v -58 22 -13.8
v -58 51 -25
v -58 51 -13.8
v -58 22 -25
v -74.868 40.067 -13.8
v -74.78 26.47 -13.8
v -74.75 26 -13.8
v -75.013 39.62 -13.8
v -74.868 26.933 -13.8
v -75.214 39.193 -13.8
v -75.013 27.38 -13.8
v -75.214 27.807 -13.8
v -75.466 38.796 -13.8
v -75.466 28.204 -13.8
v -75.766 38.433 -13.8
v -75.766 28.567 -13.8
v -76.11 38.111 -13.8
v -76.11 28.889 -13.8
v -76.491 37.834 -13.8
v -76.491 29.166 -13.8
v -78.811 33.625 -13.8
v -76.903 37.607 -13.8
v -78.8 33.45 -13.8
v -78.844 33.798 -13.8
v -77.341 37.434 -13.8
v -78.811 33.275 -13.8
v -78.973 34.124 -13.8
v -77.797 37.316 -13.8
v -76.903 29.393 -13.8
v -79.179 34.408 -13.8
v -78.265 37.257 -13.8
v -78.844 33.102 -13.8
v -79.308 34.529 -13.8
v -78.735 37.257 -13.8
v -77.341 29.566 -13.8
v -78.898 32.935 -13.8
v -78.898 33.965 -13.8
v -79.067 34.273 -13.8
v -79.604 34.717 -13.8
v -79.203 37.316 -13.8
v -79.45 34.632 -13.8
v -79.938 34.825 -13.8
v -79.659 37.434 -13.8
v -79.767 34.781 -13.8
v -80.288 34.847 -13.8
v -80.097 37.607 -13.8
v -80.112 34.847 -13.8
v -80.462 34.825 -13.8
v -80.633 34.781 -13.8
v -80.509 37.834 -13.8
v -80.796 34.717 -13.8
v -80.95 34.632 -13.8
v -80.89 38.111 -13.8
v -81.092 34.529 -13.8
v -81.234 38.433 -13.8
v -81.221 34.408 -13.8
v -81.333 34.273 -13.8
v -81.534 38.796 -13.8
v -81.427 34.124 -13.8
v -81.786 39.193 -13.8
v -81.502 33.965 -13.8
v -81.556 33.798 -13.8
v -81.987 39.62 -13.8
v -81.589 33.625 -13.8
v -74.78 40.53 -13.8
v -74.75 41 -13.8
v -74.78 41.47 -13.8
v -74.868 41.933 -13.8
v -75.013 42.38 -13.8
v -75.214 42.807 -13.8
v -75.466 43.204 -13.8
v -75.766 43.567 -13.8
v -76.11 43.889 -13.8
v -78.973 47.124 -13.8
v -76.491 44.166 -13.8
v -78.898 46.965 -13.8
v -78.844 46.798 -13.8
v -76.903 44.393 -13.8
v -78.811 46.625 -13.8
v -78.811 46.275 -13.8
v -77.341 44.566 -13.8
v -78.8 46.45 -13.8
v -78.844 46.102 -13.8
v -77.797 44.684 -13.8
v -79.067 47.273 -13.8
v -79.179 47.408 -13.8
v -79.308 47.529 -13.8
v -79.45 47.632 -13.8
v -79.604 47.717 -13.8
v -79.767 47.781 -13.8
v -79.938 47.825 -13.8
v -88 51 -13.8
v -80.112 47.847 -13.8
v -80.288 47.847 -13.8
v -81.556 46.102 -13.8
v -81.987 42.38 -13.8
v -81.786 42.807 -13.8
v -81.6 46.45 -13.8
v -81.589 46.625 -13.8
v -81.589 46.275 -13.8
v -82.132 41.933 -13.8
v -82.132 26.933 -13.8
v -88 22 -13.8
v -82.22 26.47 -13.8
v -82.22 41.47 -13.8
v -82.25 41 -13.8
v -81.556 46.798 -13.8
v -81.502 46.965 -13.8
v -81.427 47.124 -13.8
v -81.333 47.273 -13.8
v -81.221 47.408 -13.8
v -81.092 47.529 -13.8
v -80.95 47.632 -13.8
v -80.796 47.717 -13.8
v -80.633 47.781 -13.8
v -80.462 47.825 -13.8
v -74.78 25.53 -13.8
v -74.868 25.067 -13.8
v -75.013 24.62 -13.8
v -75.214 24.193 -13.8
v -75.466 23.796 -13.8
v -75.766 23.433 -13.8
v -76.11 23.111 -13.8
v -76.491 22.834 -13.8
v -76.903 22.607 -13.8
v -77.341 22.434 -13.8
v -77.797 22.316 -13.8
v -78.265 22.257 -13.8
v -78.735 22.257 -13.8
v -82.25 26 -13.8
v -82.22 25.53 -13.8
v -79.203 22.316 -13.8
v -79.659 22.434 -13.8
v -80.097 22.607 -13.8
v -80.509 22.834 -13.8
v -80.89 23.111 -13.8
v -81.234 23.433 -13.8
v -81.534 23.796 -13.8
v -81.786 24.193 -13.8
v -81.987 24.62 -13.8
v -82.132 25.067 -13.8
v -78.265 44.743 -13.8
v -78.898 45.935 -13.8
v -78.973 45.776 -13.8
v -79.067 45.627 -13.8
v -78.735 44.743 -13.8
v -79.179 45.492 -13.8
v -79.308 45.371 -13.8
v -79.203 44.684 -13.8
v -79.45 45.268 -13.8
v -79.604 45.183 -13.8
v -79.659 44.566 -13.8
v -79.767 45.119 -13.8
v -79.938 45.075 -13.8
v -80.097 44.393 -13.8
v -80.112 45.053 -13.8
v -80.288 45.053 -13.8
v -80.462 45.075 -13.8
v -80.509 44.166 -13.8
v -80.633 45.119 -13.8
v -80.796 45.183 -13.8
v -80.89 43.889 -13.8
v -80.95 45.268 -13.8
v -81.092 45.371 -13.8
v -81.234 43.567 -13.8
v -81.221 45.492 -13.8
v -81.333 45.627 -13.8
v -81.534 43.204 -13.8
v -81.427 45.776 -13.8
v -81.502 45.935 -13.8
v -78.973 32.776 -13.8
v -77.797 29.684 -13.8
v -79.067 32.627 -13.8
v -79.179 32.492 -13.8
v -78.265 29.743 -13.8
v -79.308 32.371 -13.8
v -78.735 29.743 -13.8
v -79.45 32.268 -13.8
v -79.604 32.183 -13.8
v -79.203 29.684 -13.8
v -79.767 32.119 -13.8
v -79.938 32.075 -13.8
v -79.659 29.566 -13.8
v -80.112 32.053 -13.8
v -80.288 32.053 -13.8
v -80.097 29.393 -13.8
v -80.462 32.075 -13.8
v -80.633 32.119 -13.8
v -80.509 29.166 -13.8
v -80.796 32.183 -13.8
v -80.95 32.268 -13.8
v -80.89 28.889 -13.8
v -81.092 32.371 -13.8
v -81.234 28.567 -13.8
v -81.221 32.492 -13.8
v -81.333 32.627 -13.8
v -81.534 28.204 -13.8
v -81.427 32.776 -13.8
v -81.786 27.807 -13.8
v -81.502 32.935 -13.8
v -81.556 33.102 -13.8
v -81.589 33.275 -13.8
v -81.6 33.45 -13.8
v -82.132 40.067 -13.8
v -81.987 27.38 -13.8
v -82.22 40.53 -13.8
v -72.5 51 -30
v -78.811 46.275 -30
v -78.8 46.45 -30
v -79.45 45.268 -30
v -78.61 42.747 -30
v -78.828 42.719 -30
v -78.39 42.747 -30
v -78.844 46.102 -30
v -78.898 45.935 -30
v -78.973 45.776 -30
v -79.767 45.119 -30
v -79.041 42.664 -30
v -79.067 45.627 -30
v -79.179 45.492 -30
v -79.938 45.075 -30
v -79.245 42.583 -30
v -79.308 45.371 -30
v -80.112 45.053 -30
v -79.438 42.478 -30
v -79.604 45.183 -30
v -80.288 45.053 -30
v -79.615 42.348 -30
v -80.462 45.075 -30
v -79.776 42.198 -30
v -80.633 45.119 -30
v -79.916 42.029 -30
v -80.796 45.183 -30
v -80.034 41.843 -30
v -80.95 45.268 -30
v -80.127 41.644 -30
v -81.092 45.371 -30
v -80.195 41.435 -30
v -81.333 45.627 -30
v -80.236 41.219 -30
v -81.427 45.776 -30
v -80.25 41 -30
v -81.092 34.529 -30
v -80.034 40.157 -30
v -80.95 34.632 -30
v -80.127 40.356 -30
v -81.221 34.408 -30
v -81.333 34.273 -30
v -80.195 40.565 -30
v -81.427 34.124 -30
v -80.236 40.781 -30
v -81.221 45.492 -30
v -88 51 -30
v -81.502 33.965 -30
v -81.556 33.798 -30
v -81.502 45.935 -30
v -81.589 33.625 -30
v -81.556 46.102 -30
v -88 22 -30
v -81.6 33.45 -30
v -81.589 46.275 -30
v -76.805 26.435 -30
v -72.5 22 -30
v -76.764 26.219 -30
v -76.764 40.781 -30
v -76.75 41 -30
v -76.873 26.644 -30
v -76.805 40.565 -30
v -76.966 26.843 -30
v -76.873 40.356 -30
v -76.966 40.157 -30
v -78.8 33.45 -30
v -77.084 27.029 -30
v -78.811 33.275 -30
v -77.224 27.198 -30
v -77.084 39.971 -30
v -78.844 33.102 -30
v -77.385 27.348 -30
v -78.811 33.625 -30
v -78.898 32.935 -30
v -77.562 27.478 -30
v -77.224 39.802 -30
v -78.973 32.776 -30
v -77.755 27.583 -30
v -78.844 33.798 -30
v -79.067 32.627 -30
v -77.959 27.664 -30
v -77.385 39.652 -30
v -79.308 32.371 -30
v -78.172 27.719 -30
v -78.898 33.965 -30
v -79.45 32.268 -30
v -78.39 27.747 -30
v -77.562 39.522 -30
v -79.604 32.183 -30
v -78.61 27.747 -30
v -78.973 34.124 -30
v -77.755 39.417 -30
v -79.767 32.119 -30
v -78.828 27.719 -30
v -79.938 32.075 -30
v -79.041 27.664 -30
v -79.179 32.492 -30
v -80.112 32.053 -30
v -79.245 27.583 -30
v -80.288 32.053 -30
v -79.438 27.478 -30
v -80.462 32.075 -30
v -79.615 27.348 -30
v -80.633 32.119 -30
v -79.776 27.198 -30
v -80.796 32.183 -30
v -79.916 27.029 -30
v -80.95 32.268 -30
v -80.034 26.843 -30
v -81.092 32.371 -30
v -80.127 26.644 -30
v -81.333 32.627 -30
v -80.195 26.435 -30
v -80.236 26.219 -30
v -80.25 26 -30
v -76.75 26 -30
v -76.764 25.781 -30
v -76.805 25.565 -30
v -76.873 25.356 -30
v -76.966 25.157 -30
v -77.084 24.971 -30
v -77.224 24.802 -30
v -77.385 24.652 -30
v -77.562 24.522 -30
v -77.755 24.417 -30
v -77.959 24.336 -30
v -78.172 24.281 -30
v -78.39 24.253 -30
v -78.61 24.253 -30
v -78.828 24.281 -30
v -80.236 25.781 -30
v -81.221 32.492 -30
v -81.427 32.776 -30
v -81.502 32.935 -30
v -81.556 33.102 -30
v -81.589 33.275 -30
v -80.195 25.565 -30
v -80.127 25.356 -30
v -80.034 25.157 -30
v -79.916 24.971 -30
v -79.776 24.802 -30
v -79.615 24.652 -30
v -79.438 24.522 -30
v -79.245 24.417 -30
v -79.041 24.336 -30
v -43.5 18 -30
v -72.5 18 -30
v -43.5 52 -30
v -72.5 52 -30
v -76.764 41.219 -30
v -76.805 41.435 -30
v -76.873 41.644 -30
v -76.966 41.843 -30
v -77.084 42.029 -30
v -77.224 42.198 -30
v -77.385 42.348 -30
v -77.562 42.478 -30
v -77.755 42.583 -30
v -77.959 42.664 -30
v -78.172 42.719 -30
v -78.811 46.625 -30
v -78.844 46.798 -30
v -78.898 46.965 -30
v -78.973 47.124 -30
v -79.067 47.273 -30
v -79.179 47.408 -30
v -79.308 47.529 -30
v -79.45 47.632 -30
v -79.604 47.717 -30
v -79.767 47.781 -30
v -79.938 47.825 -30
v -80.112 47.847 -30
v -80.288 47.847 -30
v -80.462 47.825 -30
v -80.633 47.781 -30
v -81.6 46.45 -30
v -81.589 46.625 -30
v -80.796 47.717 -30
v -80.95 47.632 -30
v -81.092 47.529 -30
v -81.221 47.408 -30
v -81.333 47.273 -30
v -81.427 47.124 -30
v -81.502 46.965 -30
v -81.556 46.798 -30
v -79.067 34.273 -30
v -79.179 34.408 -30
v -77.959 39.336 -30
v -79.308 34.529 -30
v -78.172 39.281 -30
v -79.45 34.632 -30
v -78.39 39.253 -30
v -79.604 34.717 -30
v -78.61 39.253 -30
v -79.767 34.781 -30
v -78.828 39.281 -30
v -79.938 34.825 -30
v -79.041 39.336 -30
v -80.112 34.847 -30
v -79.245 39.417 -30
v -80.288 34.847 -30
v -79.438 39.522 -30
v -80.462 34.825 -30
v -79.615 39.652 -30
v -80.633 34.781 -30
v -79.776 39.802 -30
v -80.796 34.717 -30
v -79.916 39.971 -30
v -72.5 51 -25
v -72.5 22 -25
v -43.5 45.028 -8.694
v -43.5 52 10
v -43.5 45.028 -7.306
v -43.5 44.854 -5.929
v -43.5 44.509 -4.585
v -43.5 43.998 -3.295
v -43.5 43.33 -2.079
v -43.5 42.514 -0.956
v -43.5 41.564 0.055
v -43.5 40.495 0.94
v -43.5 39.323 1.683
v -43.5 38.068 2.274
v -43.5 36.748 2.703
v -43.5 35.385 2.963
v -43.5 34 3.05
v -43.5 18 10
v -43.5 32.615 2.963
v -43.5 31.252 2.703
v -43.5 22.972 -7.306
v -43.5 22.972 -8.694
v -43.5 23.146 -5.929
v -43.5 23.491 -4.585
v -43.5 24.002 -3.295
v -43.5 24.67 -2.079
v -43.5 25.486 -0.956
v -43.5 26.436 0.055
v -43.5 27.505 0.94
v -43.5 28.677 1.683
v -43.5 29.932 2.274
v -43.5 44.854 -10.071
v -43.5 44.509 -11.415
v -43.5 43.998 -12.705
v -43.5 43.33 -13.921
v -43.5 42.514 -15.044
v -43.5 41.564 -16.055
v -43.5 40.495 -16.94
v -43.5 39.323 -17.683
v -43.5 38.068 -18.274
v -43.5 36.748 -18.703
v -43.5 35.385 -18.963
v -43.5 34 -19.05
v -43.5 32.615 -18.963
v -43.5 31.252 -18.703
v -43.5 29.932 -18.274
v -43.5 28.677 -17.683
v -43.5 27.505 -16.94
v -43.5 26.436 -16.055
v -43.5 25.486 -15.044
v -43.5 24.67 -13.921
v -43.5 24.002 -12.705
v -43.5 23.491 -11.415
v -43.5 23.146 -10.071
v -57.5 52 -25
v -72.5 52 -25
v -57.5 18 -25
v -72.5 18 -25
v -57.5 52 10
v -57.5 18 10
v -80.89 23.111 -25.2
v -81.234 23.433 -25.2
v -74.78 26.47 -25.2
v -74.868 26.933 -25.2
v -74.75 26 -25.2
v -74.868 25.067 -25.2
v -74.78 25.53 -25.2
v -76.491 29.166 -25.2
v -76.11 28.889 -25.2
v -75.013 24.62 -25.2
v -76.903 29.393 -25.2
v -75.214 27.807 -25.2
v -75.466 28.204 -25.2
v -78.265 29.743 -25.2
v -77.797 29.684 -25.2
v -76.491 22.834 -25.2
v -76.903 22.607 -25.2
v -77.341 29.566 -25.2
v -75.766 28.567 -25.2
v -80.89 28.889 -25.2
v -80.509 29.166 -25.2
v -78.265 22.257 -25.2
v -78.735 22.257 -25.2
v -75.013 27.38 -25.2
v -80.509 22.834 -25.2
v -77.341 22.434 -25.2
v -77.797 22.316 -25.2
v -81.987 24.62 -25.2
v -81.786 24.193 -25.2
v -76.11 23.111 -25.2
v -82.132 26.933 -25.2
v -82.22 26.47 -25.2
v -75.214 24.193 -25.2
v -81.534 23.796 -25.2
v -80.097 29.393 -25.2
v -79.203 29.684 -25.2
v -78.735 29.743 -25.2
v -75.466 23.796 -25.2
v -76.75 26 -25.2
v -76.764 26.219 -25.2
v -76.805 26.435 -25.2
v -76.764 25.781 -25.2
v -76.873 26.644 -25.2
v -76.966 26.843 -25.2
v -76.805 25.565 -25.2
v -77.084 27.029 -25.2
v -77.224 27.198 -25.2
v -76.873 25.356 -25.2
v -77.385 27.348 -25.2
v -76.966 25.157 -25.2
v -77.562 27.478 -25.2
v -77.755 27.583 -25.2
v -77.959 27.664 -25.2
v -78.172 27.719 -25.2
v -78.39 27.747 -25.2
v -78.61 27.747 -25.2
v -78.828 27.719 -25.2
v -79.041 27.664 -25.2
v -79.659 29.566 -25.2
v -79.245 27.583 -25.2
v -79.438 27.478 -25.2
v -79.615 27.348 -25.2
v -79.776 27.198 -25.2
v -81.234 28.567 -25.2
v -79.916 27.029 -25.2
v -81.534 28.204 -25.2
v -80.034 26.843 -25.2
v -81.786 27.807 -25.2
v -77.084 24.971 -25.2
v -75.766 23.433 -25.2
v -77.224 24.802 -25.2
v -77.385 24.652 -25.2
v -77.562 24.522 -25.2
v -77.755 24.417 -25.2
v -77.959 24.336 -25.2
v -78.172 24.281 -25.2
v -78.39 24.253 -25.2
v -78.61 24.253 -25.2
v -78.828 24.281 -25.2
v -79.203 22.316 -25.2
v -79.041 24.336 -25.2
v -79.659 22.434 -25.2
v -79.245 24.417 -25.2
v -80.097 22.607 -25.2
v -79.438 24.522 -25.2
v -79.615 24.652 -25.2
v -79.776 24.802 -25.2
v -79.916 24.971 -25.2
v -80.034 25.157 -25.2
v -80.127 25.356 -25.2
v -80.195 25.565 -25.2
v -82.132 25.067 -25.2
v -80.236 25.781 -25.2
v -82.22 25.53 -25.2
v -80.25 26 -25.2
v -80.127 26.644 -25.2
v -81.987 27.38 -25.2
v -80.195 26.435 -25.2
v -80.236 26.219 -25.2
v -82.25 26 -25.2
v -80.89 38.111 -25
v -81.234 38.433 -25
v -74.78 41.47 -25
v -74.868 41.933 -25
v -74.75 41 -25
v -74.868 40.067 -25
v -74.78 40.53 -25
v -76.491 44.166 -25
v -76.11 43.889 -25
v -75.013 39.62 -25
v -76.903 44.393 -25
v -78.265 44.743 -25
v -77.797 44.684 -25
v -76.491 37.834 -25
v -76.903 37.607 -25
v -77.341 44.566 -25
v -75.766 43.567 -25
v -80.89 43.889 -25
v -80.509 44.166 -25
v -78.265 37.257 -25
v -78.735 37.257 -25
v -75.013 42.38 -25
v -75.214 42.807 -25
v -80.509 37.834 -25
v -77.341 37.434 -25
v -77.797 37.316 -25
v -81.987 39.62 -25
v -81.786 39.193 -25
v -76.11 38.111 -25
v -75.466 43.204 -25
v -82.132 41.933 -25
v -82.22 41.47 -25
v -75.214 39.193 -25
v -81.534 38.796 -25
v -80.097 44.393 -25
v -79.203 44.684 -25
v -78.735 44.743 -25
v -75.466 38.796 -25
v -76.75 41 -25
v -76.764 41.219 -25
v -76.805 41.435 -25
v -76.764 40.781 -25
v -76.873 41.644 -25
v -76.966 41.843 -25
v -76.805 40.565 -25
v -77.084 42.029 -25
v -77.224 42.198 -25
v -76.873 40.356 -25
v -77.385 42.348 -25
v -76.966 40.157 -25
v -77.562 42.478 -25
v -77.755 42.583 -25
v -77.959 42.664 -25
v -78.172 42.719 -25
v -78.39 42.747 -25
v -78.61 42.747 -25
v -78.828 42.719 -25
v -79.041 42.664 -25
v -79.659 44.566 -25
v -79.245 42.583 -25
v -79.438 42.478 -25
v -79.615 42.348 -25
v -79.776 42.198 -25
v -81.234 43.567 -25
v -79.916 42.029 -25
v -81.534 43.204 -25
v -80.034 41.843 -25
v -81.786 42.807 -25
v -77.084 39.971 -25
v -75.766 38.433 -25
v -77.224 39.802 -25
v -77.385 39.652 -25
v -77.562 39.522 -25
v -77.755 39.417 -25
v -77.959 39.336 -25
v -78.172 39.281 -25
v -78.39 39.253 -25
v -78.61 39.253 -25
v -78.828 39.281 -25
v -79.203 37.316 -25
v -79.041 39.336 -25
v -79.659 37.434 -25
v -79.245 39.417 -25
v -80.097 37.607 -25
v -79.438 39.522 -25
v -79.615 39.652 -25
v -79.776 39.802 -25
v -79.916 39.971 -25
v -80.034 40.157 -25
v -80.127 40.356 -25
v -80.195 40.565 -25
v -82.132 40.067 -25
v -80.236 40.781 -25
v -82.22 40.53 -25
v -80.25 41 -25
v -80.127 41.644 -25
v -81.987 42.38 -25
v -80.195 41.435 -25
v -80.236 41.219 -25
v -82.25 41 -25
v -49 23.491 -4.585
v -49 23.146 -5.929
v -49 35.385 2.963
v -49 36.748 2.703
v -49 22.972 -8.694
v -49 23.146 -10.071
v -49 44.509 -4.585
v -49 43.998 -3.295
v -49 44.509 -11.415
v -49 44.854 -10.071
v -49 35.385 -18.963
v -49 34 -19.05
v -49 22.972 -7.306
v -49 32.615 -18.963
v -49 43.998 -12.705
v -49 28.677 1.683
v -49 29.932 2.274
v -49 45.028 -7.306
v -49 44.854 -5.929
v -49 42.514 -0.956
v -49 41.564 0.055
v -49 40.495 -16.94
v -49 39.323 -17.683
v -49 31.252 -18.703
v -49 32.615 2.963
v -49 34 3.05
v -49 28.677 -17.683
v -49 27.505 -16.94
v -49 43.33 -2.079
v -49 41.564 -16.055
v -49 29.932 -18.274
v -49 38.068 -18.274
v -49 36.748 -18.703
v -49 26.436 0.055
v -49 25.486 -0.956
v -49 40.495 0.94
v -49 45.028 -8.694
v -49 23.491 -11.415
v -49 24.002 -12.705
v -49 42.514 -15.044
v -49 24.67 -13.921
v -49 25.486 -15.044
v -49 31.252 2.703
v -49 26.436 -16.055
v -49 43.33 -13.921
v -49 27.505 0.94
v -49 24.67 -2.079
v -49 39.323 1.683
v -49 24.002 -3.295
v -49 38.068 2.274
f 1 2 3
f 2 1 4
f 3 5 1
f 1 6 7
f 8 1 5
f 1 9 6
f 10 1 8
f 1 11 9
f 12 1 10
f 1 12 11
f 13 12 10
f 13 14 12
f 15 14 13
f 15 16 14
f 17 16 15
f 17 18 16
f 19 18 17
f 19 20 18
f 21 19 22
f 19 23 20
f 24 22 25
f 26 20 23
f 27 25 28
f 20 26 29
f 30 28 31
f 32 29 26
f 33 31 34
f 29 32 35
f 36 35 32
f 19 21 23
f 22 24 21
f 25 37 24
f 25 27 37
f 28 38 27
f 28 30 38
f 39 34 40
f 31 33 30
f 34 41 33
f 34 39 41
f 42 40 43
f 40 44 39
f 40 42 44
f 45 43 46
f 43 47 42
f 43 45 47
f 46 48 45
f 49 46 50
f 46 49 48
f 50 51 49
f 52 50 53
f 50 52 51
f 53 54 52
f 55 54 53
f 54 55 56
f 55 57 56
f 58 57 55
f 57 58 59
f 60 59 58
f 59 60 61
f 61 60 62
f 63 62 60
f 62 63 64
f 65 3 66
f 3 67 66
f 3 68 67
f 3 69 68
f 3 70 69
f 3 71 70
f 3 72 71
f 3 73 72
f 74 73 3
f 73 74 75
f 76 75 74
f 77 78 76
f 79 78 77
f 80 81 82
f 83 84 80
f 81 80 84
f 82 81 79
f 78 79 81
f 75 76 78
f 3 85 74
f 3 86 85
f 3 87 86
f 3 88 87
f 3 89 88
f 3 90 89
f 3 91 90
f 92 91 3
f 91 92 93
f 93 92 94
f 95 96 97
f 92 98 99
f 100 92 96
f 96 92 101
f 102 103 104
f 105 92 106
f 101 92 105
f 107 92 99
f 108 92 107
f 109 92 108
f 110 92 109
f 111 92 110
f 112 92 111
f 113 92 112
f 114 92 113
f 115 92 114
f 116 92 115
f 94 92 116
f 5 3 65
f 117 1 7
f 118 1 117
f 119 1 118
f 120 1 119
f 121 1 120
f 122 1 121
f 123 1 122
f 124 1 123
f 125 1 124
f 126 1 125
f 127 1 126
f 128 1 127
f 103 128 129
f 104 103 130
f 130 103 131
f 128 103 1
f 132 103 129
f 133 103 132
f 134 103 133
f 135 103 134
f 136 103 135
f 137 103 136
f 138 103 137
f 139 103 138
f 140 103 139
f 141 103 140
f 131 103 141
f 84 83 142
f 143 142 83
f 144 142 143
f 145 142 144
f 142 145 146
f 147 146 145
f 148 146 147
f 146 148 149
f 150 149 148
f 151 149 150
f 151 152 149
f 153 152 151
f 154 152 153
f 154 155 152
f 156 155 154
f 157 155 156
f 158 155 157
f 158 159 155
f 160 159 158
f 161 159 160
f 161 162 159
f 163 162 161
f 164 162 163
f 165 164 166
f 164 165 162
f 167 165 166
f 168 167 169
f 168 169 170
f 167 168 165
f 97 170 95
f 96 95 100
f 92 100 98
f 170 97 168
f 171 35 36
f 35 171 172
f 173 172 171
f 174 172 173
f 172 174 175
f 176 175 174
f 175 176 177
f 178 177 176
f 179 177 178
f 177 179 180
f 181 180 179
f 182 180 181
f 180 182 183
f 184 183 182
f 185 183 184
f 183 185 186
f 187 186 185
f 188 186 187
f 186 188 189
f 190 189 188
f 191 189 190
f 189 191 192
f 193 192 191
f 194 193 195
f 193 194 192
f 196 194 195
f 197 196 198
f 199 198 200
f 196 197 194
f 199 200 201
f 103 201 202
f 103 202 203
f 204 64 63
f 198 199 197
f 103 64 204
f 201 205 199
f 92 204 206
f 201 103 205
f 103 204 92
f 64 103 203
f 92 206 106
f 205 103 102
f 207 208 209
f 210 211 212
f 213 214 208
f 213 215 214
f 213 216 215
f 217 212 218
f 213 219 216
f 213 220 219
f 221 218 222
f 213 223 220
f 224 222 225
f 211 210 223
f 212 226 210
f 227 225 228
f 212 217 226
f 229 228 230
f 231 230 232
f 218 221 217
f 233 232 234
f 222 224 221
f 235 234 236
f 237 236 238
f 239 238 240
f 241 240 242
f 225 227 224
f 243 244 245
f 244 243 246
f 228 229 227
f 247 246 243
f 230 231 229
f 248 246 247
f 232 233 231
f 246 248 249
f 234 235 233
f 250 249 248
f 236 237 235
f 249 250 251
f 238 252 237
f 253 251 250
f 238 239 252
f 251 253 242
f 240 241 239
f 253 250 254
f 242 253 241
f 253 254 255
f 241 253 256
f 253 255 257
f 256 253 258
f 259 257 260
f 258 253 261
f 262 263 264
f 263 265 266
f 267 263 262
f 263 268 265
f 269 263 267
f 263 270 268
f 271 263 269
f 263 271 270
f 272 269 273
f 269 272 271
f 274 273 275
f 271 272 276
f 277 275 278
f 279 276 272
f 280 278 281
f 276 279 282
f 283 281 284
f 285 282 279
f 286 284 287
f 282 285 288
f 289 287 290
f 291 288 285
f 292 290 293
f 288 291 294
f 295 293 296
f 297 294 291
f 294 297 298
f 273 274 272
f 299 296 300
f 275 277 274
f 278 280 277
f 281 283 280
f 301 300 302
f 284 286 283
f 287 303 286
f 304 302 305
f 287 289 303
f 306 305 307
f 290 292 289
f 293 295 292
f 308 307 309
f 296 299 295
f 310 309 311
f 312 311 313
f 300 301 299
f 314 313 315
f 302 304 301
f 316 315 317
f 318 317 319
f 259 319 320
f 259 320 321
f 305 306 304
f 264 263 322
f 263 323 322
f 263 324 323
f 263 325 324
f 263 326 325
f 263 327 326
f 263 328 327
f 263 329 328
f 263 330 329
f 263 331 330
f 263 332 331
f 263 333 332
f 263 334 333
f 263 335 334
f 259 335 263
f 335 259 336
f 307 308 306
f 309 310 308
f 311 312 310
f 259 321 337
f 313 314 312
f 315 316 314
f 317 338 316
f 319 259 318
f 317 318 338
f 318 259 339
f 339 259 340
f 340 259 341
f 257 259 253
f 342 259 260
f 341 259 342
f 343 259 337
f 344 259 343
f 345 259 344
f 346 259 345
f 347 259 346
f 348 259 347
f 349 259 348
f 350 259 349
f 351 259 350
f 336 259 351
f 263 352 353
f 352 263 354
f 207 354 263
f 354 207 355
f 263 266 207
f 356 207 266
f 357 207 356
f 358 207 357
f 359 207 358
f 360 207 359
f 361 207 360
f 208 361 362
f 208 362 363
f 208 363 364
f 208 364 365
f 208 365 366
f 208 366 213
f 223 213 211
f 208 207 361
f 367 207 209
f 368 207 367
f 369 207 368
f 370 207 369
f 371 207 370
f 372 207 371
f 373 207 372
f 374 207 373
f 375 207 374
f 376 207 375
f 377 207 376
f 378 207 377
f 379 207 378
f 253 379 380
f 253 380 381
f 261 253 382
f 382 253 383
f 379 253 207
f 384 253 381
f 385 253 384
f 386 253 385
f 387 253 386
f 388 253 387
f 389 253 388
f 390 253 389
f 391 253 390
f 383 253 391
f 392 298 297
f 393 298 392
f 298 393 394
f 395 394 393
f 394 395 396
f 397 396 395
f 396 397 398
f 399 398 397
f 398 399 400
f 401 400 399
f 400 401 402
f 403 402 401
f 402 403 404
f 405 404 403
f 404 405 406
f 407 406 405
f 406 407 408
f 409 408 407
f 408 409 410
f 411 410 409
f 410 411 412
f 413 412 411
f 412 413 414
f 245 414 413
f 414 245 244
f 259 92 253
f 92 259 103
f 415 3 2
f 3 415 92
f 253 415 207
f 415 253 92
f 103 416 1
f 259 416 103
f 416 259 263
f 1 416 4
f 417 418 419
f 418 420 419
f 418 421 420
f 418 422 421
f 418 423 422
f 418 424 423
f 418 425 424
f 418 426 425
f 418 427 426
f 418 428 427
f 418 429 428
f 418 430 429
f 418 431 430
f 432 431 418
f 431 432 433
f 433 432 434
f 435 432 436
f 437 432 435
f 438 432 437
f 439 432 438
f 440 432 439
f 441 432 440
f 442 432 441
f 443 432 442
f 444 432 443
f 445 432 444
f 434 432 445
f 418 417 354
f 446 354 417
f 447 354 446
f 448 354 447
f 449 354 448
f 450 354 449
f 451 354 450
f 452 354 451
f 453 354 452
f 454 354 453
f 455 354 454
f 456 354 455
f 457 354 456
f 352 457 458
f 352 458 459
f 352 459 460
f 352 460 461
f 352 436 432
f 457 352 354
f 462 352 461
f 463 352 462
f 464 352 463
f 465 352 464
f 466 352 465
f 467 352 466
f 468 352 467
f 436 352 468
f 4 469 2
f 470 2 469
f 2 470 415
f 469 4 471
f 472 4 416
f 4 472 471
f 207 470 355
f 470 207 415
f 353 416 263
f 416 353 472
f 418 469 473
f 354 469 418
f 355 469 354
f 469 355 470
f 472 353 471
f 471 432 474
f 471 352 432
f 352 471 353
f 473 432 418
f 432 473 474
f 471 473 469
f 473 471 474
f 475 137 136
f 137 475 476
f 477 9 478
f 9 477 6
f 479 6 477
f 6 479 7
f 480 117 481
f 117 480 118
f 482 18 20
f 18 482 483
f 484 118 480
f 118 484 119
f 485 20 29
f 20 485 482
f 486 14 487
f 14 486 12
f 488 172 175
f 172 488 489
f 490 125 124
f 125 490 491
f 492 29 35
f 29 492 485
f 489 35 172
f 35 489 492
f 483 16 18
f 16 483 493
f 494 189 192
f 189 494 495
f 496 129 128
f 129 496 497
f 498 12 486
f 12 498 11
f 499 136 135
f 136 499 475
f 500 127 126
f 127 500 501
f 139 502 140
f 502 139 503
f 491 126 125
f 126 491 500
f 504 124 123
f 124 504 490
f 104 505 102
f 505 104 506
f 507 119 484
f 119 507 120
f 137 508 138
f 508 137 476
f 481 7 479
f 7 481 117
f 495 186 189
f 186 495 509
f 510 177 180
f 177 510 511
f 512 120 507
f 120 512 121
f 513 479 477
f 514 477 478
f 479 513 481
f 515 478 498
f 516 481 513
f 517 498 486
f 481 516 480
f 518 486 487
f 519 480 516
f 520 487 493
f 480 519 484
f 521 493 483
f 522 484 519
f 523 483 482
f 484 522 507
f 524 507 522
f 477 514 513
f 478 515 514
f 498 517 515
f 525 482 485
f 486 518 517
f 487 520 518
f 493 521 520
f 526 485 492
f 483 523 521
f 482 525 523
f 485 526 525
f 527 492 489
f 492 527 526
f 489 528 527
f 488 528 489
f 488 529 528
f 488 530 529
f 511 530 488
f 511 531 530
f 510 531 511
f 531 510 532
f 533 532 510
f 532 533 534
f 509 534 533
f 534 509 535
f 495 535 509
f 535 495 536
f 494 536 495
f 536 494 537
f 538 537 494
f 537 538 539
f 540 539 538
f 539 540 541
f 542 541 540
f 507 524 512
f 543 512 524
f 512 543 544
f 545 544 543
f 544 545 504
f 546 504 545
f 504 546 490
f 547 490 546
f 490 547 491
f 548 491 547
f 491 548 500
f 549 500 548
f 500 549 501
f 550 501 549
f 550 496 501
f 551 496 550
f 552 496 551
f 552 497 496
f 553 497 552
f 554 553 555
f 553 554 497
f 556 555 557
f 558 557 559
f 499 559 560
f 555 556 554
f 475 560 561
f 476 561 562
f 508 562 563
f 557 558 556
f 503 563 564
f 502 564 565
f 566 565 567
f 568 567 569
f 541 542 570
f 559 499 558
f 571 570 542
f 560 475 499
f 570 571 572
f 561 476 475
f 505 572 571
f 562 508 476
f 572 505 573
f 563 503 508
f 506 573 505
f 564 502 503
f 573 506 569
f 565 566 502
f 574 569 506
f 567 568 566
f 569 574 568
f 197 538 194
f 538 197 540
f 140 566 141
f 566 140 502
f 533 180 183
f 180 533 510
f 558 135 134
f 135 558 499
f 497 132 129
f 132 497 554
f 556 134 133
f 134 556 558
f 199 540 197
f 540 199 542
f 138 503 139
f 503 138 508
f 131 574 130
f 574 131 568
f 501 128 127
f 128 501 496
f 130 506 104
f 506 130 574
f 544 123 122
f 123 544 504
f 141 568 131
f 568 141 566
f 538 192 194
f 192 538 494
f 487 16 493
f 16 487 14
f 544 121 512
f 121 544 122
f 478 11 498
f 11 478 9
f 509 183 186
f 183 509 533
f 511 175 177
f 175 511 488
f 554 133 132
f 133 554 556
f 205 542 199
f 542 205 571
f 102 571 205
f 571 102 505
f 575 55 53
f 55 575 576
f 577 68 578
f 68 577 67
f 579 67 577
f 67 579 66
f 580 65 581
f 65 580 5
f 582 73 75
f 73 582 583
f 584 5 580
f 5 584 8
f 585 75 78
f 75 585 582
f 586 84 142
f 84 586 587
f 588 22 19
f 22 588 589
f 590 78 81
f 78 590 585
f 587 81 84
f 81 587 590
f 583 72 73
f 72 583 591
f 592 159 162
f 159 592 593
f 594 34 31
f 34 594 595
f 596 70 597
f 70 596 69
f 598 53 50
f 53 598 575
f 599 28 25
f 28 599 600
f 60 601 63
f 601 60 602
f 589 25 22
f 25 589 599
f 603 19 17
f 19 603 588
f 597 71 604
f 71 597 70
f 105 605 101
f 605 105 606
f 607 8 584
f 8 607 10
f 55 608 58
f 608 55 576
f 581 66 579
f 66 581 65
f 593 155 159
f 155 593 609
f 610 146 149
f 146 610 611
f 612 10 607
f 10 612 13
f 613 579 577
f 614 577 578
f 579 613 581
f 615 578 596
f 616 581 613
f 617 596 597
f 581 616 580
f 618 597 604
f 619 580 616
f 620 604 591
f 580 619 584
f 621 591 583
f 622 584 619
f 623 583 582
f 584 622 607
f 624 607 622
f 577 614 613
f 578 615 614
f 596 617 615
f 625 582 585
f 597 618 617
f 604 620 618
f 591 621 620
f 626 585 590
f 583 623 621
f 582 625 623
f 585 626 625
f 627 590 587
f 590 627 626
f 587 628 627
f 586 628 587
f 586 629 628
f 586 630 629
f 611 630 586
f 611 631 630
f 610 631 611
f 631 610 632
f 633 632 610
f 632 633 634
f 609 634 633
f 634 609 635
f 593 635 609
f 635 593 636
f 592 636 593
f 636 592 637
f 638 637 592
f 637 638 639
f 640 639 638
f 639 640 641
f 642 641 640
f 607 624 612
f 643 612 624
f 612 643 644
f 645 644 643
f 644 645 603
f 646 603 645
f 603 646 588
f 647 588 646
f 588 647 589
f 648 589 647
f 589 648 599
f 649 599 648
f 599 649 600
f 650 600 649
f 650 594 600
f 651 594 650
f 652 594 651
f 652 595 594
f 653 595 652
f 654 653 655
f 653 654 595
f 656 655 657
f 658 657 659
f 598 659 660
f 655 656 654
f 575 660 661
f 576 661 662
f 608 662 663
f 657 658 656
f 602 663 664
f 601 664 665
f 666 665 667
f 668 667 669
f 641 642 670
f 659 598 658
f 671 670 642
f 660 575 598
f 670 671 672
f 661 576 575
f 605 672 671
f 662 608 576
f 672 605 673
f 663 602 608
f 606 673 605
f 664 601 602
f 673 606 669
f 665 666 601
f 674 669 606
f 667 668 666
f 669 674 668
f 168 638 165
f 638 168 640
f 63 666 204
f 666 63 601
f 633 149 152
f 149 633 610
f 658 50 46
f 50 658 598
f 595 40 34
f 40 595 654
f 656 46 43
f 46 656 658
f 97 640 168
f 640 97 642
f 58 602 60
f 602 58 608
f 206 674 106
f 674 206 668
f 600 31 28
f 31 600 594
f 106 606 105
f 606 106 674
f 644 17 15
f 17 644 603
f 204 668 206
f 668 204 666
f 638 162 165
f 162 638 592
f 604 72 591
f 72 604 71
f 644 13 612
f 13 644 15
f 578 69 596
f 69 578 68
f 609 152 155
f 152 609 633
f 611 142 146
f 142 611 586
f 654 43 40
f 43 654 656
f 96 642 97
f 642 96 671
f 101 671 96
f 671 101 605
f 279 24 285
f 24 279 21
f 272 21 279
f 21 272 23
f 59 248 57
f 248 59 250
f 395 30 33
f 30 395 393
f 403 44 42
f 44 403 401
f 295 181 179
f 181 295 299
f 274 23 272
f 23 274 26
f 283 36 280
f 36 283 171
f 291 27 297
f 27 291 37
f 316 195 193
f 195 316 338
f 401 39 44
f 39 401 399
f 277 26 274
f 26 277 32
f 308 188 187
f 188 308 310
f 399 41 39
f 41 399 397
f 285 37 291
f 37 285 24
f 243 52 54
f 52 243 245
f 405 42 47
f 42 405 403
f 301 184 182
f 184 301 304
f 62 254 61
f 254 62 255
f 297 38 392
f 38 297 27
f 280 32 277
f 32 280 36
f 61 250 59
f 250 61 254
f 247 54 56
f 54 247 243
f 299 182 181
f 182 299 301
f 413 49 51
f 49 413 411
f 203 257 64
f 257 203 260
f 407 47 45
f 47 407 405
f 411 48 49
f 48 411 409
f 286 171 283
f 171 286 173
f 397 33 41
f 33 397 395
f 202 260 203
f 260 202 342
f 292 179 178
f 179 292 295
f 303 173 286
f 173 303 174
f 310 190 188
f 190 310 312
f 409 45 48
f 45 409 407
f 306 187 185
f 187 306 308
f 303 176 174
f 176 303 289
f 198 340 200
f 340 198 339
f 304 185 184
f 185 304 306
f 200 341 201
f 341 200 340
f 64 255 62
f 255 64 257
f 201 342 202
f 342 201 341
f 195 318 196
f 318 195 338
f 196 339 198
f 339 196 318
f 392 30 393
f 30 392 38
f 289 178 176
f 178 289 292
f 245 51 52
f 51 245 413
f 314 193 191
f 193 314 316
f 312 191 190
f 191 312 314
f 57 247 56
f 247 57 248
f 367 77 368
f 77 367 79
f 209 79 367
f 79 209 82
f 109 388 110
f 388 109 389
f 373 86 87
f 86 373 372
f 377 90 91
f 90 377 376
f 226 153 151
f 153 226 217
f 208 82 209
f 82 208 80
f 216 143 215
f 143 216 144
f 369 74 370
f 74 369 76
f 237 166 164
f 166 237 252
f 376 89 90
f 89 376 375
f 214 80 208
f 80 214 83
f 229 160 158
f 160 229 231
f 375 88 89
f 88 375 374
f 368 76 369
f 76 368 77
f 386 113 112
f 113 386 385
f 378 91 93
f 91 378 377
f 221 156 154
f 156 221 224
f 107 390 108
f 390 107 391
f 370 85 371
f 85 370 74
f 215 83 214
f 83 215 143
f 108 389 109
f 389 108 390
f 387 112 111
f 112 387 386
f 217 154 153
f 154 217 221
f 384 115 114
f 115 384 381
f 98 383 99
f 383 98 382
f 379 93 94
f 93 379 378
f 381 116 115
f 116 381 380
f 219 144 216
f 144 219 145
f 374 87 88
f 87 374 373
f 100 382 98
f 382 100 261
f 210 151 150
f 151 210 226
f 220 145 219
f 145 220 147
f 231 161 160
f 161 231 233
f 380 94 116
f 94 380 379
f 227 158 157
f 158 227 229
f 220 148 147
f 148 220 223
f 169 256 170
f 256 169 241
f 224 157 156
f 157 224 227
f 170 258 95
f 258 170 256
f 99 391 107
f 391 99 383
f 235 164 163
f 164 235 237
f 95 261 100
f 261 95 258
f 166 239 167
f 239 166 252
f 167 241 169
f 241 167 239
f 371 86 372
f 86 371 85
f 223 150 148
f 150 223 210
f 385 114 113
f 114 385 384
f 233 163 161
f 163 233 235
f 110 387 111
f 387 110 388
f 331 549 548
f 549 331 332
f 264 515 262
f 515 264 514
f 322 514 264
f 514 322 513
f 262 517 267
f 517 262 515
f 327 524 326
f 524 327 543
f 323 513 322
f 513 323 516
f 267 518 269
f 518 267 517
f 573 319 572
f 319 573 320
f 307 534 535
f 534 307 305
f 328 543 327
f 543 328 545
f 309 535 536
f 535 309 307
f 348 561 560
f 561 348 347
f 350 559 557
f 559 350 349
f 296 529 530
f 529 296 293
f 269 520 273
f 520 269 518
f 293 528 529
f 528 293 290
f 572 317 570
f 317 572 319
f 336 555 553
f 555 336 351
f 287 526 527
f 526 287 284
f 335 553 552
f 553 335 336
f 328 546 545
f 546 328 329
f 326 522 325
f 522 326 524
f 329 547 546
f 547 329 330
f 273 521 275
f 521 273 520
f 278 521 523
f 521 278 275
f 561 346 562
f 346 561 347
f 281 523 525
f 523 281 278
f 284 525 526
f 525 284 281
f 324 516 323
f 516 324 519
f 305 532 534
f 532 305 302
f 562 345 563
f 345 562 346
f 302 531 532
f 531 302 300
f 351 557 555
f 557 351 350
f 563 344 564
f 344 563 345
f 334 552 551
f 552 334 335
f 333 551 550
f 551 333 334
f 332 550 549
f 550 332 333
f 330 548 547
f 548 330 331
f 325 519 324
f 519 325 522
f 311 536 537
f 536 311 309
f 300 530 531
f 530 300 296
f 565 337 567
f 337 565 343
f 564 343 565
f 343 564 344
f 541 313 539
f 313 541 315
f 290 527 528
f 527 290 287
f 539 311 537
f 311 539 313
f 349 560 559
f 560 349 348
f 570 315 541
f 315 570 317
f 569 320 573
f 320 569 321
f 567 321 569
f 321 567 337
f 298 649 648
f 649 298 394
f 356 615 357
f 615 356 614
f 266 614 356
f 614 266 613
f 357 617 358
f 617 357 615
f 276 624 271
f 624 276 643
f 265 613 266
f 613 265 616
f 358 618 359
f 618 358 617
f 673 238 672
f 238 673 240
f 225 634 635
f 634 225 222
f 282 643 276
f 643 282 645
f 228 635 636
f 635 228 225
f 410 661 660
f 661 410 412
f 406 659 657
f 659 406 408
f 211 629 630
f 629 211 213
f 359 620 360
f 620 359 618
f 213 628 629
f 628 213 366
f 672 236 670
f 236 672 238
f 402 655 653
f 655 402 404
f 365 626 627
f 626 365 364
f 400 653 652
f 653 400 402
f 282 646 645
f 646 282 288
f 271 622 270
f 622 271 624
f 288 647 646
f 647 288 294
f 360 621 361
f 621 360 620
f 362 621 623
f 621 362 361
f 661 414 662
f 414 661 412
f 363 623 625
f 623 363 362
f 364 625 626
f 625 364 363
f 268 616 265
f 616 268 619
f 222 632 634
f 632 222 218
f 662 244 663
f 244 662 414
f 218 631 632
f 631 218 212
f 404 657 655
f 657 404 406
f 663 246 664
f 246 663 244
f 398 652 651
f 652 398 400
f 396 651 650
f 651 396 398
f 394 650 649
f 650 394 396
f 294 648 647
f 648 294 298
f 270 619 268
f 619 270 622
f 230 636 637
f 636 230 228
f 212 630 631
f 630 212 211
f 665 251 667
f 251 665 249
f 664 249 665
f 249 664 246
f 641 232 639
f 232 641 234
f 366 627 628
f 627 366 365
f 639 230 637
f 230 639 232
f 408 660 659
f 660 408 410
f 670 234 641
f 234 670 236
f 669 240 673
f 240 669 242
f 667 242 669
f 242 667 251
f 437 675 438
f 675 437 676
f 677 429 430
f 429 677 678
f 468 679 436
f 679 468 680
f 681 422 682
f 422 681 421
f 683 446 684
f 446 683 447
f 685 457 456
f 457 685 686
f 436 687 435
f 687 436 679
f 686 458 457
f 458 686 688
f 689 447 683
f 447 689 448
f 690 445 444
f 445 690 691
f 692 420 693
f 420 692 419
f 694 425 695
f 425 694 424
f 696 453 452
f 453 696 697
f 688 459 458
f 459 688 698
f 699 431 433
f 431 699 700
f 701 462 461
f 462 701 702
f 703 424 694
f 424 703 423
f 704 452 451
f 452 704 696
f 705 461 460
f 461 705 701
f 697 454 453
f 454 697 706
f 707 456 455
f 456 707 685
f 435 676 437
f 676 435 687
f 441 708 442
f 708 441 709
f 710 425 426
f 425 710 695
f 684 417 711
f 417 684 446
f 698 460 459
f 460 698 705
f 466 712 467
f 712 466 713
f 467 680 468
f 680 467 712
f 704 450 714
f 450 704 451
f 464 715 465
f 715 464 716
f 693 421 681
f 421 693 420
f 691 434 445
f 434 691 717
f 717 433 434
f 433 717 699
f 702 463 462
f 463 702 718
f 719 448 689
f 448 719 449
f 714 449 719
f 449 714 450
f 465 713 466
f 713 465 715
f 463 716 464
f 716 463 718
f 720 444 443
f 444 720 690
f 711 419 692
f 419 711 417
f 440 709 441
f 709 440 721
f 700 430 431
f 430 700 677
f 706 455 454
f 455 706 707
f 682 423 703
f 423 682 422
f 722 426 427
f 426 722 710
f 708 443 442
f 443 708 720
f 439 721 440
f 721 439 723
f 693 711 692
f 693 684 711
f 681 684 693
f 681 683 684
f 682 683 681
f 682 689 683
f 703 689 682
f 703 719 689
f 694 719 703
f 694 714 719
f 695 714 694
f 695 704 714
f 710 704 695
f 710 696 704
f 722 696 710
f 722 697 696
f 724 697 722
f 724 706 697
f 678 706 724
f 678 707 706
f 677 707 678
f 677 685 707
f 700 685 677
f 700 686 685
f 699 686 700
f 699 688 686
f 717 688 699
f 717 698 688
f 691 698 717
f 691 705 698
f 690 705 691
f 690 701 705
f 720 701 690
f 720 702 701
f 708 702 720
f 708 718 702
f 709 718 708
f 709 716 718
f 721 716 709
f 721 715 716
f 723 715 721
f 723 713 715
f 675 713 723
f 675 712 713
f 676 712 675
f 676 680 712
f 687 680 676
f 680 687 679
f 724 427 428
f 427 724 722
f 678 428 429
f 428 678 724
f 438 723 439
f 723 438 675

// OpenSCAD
// ============================================================================
//  18650 SCORE-&-DECAP LAB FIXTURE  —  parametric OpenSCAD assembly
// ============================================================================
//
//  PURPOSE
//    Single fixture, TWO independent recipes on a discharged 18650 cell:
//
//    (1) SCORE  — Collet grips the can BODY. SPIN rotates the cell. FEED pushes
//                 a pipe-cutter WHEEL radially inward (from +Y), landing just
//                 under the positive crimp (~4 mm from the cap face). One or two
//                 slow revolutions. A depth collar limits plunge so the wheel
//                 stops BEFORE the jelly roll. FEED then retracts.
//
//    (2) STRIP  — DECAP slides the cell (+X) so the cap meets a FIXED anvil.
//                 A hobby servo pinches the cap against a TPU pad. DECAP reverses
//                 (-X); the body slides off, the cap stays behind. The blade does
//                 NOT participate in this recipe.
//
//    The two recipes are deliberately NOT merged into a helical cut.
//
//  COORDINATE SYSTEM
//    Cell axis   = X   (cap toward +X, body toward -X)
//    Blade feed  = Y   (wheel enters from +Y, travels toward -Y)
//    Up          = Z
//    Origin      = the SCORE POINT (where the wheel meets the can), on the axis.
//
//  AXES / DRIVES
//    SPIN   = NEMA 14, direct rotary on the collet.
//    FEED   = NEMA 14 + T8x2 leadscrew + MGN9 rail, blade in/out along Y.
//    DECAP  = NEMA 17 + T8x2 leadscrew + MGN9 rail, body along cell axis X.
//    CLAMP  = hobby servo (SG90-class) + TPU pad, pinches the cap at the anvil.
//
//  HAZARD / FUME NOTE (HF)
//    Motors are NOT boxed. The PP cowling wraps ONLY the cell + blade zone plus a
//    50 mm snorkel stub for extraction. All motors sit on the same base plate,
//    held motor_standoff (default 190 mm, floor 150 mm) away from the score.
//
// ----------------------------------------------------------------------------
//  STL EXPORT  (set  mode="part"  then set  export_part  to one name; F6; F7)
// ----------------------------------------------------------------------------
//    Printed parts (separate modules):
//      base_plate ....... PA12-CF or 6 mm Al plate substitute   (PA12-CF)
//      collet ........... clamps the can body                    (PA12-CF)
//      spin_mount ....... carries SPIN motor + collet            (PA12-CF)
//      feed_carriage .... rides FEED MGN9, holds blade_fork      (PA12-CF)
//      decap_carriage ... rides DECAP MGN9, carries spin_mount   (PA12-CF)
//      anvil ............ fixed cap stop at +X                   (PA12-CF)
//      servo_bracket .... holds servo + TPU pad at the anvil     (PA12-CF)
//      cowling_lower .... fume shroud, lower half                (PP or PA12-CF)
//      cowling_upper .... fume shroud, upper half + snorkel      (PP or PA12-CF)
//      blade_fork ....... holds cutter wheel + depth collar      (PA12-CF)
//      depth_collar ..... plunge limiter riding on the can       (PA12-CF)
//
//  MATERIALS
//      Cowling ........... PP (chemical/fume) or PA12-CF (stiffer, MJF)
//      Carriages/mounts .. PA12-CF
//      Servo pad ......... TPU (see servo_pad module)
//
//  ASSEMBLY vs PART
//      mode="assembly"  renders the full fixture in the DEFAULT POSE.
//      mode="part"      renders exactly one module named by export_part.
// ============================================================================


// =========================== PARAMETER BLOCK ================================
// ---- global render mode ----
mode        = "part";      // "assembly" | "part"
export_part = "base_plate";        // used only when mode=="part"

$fn = 64;

// ---- cell (Ø18 x 65 nominal 18650) ----
cell_dia        = 18.0;        // can outer diameter
cell_len        = 65.0;        // can length
crimp_from_cap  = 4.0;         // score plane distance from the +X cap face
cap_face_dia    = 17.0;        // positive cap disc diameter (for anvil/servo)

// ---- cutter wheel (pipe-cutter style) ----
wheel_dia       = 21.0;        // Ø20-22
wheel_thick     = 3.5;
wheel_bore      = 4.0;         // axle bore
score_depth     = 0.60;        // radial bite past the can OD (collar-limited)

// ---- FEED axis (blade in/out, along Y) ----
feed_retract    = 8.0;         // DEFAULT POSE: blade retracted this far (clear)
feed_travel     = 30.0;        // usable stroke
feed_screw      = "T8x2";      // T8 x 2 mm lead
feed_rail       = "MGN9";
feed_block      = "MGN9H";

// ---- DECAP axis (body along cell axis X) ----
decap_travel    = 55.0;        // must exceed cell_len for full strip-off
decap_screw     = "T8x2";
decap_rail      = "MGN9";
decap_block     = "MGN9H";

// ---- motor standoff (HF: keep motors away from the fume/score zone) ----
motor_standoff  = 190.0;       // from score point; parameterize
MOTOR_STANDOFF_FLOOR = 150.0;  // hard floor
motor_standoff_eff = max(motor_standoff, MOTOR_STANDOFF_FLOOR);

// ---- cowling / fume ----
cowl_wall       = 3.0;
cowl_clear      = 6.0;         // clearance around cell+blade envelope
snorkel_dia     = 50.0;        // extraction stub bore
snorkel_len     = 50.0;        // 50 mm snorkel stub
cowl_split_z    = 0;           // lower/upper split plane at axis height

// ---- base plate ----
base_th         = 8.0;
base_margin     = 20.0;

// ---- rail derivation (length = standoff + travel + block + margin) ----
mgn9_block_len  = 20.0;        // MGN9H carriage body length
mgn9_rail_w     = 9.0;
mgn9_rail_h     = 6.5;         // rail profile height
rail_margin     = 15.0;

feed_rail_len  = motor_standoff_eff + feed_travel + mgn9_block_len + rail_margin;
decap_rail_len = motor_standoff_eff + decap_travel + mgn9_block_len + rail_margin;

// ---- NEMA motor bodies ----
nema14_w = 35.2; nema14_len = 36.0; nema14_shaft_d = 5.0;  nema14_shaft_l = 20.0;
nema17_w = 42.3; nema17_len = 40.0; nema17_shaft_d = 5.0;  nema17_shaft_l = 22.0;

// ---- servo (SG90-class) ----
servo_body   = [23, 12.5, 22];
servo_horn_r = 9.0;
servo_pad    = [10, 14, 4];    // TPU pad footprint (x,y,z)

// ---- collet ----
collet_len   = 22.0;
collet_od    = 34.0;
collet_slots = 4;

// ---- axis height above base ----
axis_z = 40.0;                 // cell centerline height over the base top

// ---- colors ----
C_PRINT = [0.30, 0.55, 0.85];  // printed PA12-CF
C_COWL  = [0.85, 0.85, 0.30, 0.35];
C_METAL = [0.7, 0.7, 0.72];
C_CELL  = [0.55, 0.55, 0.58];
C_TPU   = [0.15, 0.15, 0.15];
C_RAIL  = [0.6, 0.62, 0.66];

// =========================== END PARAMETER BLOCK ===========================


// ------------------------- derived geometry helpers ------------------------
// Score point is the ORIGIN. Cap face sits at +X = crimp_from_cap.
cap_face_x    = crimp_from_cap;               // +X face of cap
cell_neg_x    = cap_face_x - cell_len;        // -X end of body
wheel_center_y = cell_dia/2 + wheel_dia/2 - score_depth; // wheel axle Y at cut
feed_home_y    = wheel_center_y + feed_retract;          // retracted axle Y


// =============================================================================
//  BOUGHT-HARDWARE MODULES  (visual placeholders, not for print)
// =============================================================================


echo(decap_rail_len);



//base_plate();
//mgn9_block_decapper();
//mgn9_block_decapper_base();
//
//color("pink")translate([-150,22,-40])rotate([0,0,-90])oneml_syringe_stepper_linear_m8nut_coupler();
//spinning_cap();
//spinning_part();
//battery_18650_holder();
mgn9_block_makelathe();

module spinning_cap(){

translate([480,320,250])
rotate([0,0,90]){
translate([30,35.5,-38])rotate([90,0,90])color("pink")import("../stls/MGN9CCradileBYGuls.STL");
translate([-130,-160,-40])import("../stls/150mm_MGN9C_Guls.stl");


translate([28,0,0]){
translate([17,45,-8])rotate([0,90,0])bearing_608();
color("silver")translate([-6,45,-8])rotate([0,90,0])cylinder(d=8,h=40,$fn=50);
color("silver")translate([28,45,-8])rotate([0,90,0])cylinder(d=15,h=6.5,$fn=6);
color("silver")translate([7,45,-8])rotate([0,90,0])cylinder(d=15,h=6.5,$fn=6);

battery_makelathe_cap();

translate([-29,79,0])rotate([0,0,180]){ 
mgn9_block_makelathe();
translate([-125,60,-18])rotate([0,90,0])color("silver")cylinder(d=8,h=100,$fn=100);
color("pink")translate([-150,22,-40])rotate([0,0,-90])oneml_syringe_stepper_linear_m8nut_coupler();
}
}
}
}


/*
difference(){
translate([-200,50,-40])rotate([90,0,0])import("../stls/250mm_MGN9C_Guls.STL");
#translate([-200,25,-45])cube([150,50,20]);
}
*/



/*
*/
module spinning_part(){
translate([470,250,250])rotate([0,0,90]){
//mgn9_block_makelathe();
mgn9_block_decapper();
mgn9_block_decapper_base();
translate([-69.6,18,-25.3])rotate([0,0,-90])color("grey")import("../stls/NEMA14.stl");
translate([20-13.5+58,35.2,0-7.7])cell_18650();
battery_18650_holder();
}

translate([425.5,250+150,239.8])rotate([0,0,-90]){
translate([-69.6,18,-25.3])rotate([0,0,-90])color("grey")import("../stls/NEMA14.stl");
translate([0,0,0])mgn9_block_decapper();
}
}

module mgn9_rail(len) {
    color(C_RAIL)
    translate([-len/2, -mgn9_rail_w/2, 0])
        cube([len, mgn9_rail_w, mgn9_rail_h]);
}

module mgn9h_block() {
    // MGN9H carriage: ~20 long x 20 wide x 10 tall, sits over the rail
    color(C_METAL)
    translate([-mgn9_block_len/2, -10, mgn9_rail_h - 1])
        cube([mgn9_block_len, 20, 10]);
}

module leadscrew(len, d=8) {
    color(C_METAL) rotate([0,90,0]) cylinder(h=len, d=d, center=true);
}

module pom_nut() {
    color([0.9,0.9,0.85]) rotate([0,90,0]) {
        cylinder(h=15, d=10.2, center=true);
        translate([0,0,-1]) cylinder(h=4, d=22, center=true); // flange
    }
}

module nema(w, len, shaft_d, shaft_l) {
    color(C_METAL) {
        translate([-len,0,0]) rotate([0,90,0])
            linear_extrude(len) offset(r=2) square(w-4, center=true);
        rotate([0,90,0]) cylinder(h=shaft_l, d=shaft_d); // shaft along +X
    }
}
module nema14() { nema(nema14_w, nema14_len, nema14_shaft_d, nema14_shaft_l); }
module nema17() { nema(nema17_w, nema17_len, nema17_shaft_d, nema17_shaft_l); }

module t8_and_nut(len) { leadscrew(len); pom_nut(); }

module cell_18650() {
    // body toward -X, cap toward +X; origin is the score plane.
    color(C_CELL)
    translate([cell_neg_x, 0, 0]) rotate([0,90,0]) {
        cylinder(h=cell_len, d=cell_dia);                        // can body
        translate([0,0,cell_len]) cylinder(h=1.2, d=cap_face_dia); // + cap disc
    }
}

module cutter_wheel() {
    color(C_METAL) difference() {
        rotate([0,90,0]) cylinder(h=wheel_thick, d=wheel_dia, center=true);
        rotate([0,90,0]) cylinder(h=wheel_thick+1, d=wheel_bore, center=true);
    }
}


// =============================================================================
//  PRINTED-PART MODULES
//  Each is authored at its own local origin, then placed by the assembly.
// =============================================================================




// ---- base_plate --------------------------------------------------------------
module base_plate() {
    // spans from behind the DECAP motor (-X) to the anvil (+X), and across Y
    // to host the FEED rail. Origin = score point, top at z=0 (base below).
    x_min = cell_neg_x - motor_standoff_eff - base_margin;
    x_max = cap_face_x + motor_standoff_eff*0.4 + base_margin; // anvil side
    y_max = feed_home_y + motor_standoff_eff + base_margin;
    y_min = -(cell_dia + base_margin);
    color(C_PRINT)
    translate([x_min, y_min, -axis_z - base_th])
        cube([x_max - x_min, y_max - y_min, base_th]);
}

module motormount_screws(){
 mmx = 42;
 mmy = 42;
 mmz = 8.5;
 mmposx = 0;
 mmposy = 19;
 mmposz = -18.5;
 m6rad = 6.5/2;
 m3rad = 4.5/2;
 motrad = 11.5;
 //motrad = 4;
 difference(){
  translate([mmposx-1,mmposy,mmposz])
  cube([mmx+1,mmy,mmz]);
  translate([mmposx+mmx/2,mmposy+mmy/2,mmposz-0.1])
  cylinder(r=motrad, h=10);
  translate([mmposx+mmx/2,mmposy+mmy/2,mmposz-0.1])
  translate([0,0,-100])
  cylinder(r=4.3, h=400);
  //m3 motor screws
  translate([mmposx+mmx/2-15.5,mmposy+mmy/2-15.5,mmposz-0.1])
  cylinder(r=m3rad, h=9);
  translate([mmposx+mmx/2-15.5,mmposy+mmy/2+15.5,mmposz-0.1])
  cylinder(r=m3rad, h=9);
  translate([mmposx+mmx/2+15.5-1.5,mmposy+mmy/2+15.5,mmposz-0.1])
  cylinder(r=m3rad, h=90);
  translate([mmposx+mmx/2+15.5-1.5,mmposy+mmy/2+15.5,mmposz-0.1])
  translate([0,-2,0])
  cube([8,4.5,90]);
  translate([mmposx+mmx/2+15.5-1.5,mmposy+mmy/2-15.5,mmposz-0.1])
  cylinder(r=m3rad, h=90);
  translate([mmposx+mmx/2+15.5-1.5,mmposy+mmy/2-15.5,mmposz-0.1])
  translate([0,-2.25,0])
  cube([8,4.5,90]);
  translate([-60,32,-14.5])rotate([0,90,0])cylinder(r=2.7/2,h=80);
  translate([-60,32+14,-14.5])rotate([0,90,0])cylinder(r=2.7/2,h=80);
  translate([-60,32,-14.5])rotate([0,90,0])cylinder(r=8/2,h=56);
  translate([-60,32+14,-14.5])rotate([0,90,0])cylinder(r=8/2,h=56);
 }
}


module oneml_syringe_stepper_linear_m8nut_coupler(){
mirror([0,1,0]){
translate([0,-20-9,0])difference(){
union(){
translate([-38.25+14-13.9,-70+30-5,22.5])rotate([-90,0,0])cylinder(r=17.5/2,h=23+3);
translate([-38.25+14-13.9,-70+30.-5,22.5+3.8])cube([31,11+5,3.7+1.25]);
}
//cylinder(r=7.4,h=sl+4,$fn=6);
//translate([-38.25+14-13.9,-70+30,22.5])rotate([-90,0,0])cylinder(r=11.4/2,h=41,$fn=6);
translate([-38.25+14-13.9,-70+30-10+8,22.5])rotate([-90,0,0])cylinder(r=7.25,h=28,$fn=6);
translate([-38.25+14-13.9,-70+30-30,22.5])rotate([-90,0,0])cylinder(r=8.7/2,h=241);
translate([-38.25+14-13.9+13.7,-70+34-4.8,22.5+3.8-30])cylinder(r=3.7/2,h=120);
translate([-38.25+14-13.9+13.7+13,-70+34-4.8,22.5+3.8-30])cylinder(r=3.7/2,h=120);
}
}
}

module cell_18650() {
    // body toward -X, cap toward +X; origin is the score plane.
    color(C_CELL)
    translate([cell_neg_x, 0, 0]) rotate([0,90,0]) {
        cylinder(h=cell_len, d=cell_dia);                        // can body
        translate([0,0,cell_len]) cylinder(h=1.2, d=cap_face_dia); // + cap disc
    }
}


module mgn9_block_decapper_base(){
translate([-100,22,-30-10])color("lime")difference(){
union(){
translate([12,0,0])cube([30,23,10]);
translate([0+14,-10,0])cube([15,23+20,5]);
}

translate([12,0,0]){
translate([9.5,4,-0])cylinder(d=2.8,h=30,$fn=50);
translate([9.5,4+15,-0])cylinder(d=2.8,h=30,$fn=50);
}
translate([14,0,0]){
translate([9.5-2,4-9,0])cylinder(d=3.5,h=30,$fn=50);
translate([9.5-2,4+15+9,0])cylinder(d=3.5,h=30,$fn=50);
}

}
}

module mgn9_block_decapper(){
translate([-100,22,-30])color("lightblue")difference(){
union(){
//translate([12,0,0])cube([30,23,16.2]);
translate([12,0,0])cube([30,23,5]);
translate([7.5+20,7-7-4,0])cube([17+32,22+12,5]);
translate([7.5+64,7-7-4,0])cube([5,22+12,40]);
}
translate([7.5+63.3,7-7-4+17.4,22.3])rotate([0,90,0])cylinder(d=23.5,h=30,$fn=50);

hull(){
translate([7.5+63.3-3,7-7-4+17.4-15+2.1,35.3])rotate([0,90,0])cylinder(d=3.8,h=30,$fn=50);
translate([7.5+63.3-3,7-7-4+17.4-15+2.1,35.3+5])rotate([0,90,0])cylinder(d=3.8,h=30,$fn=50);
}
translate([0,26,0])hull(){
translate([7.5+63.3-3,7-7-4+17.4-15+2.1,35.3])rotate([0,90,0])cylinder(d=3.8,h=30,$fn=50);
translate([7.5+63.3-3,7-7-4+17.4-15+2.1,35.3+5])rotate([0,90,0])cylinder(d=3.8,h=30,$fn=50);
}
translate([7.5+63.3-3,7-7-4+17.4-15+2.1,35.3-26])rotate([0,90,0])cylinder(d=3.8,h=30,$fn=50);
translate([7.5+63.3-3,7-7-4+17.4-15+2.1+26,35.3-26])rotate([0,90,0])cylinder(d=3.8,h=30,$fn=50);
/*
*/
translate([12,0,0]){
translate([9.5,4,-2])cylinder(d=3.5,h=30,$fn=50);
translate([9.5,4+15,-2])cylinder(d=3.5,h=30,$fn=50);
/*
#translate([0,0,5]){
translate([9.5,4,-0.2])cylinder(d=7.5,h=30,$fn=50);
translate([9.5,4+15,0])cylinder(d=7.5,h=30,$fn=50);
}
*/


}
}
}

module mgn9_block_makelathe(){
translate([-100,22,-30])color("lightblue")difference(){
union(){
translate([12,0,0])cube([30,23+6,16.2]);
translate([7.5+20,7-7-4,0])cube([17+12,22+12,5]);
translate([7.5+20+15,7-7-4,0])cube([17+12-15,22+12,40]);

//#translate([7.5+64,7-7-4,0])cube([5,22+12,40]);
}
translate([37,-22-11,30])translate([15-1,45,-8])rotate([0,90,0])cylinder(d=22.1,h=6,$fn=50);
translate([7.5+63.3,7-7-4+17.4,22.3])rotate([0,90,0])cylinder(d=23.5,h=30,$fn=50);

/*
hull(){
translate([7.5+63.3-3,7-7-4+17.4-15+2.1,35.3])rotate([0,90,0])cylinder(d=3.8,h=30,$fn=50);
translate([7.5+63.3-3,7-7-4+17.4-15+2.1,35.3+5])rotate([0,90,0])cylinder(d=3.8,h=30,$fn=50);
}
translate([0,26,0])hull(){
translate([7.5+63.3-3,7-7-4+17.4-15+2.1,35.3])rotate([0,90,0])cylinder(d=3.8,h=30,$fn=50);
translate([7.5+63.3-3,7-7-4+17.4-15+2.1,35.3+5])rotate([0,90,0])cylinder(d=3.8,h=30,$fn=50);
}
translate([7.5+63.3-3,7-7-4+17.4-15+2.1,35.3-26])rotate([0,90,0])cylinder(d=3.8,h=30,$fn=50);
translate([7.5+63.3-3,7-7-4+17.4-15+2.1+26,35.3-26])rotate([0,90,0])cylinder(d=3.8,h=30,$fn=50);
*/

/*
for(i=[-1:5]){
#translate([9.5-1.7+95+1.25-(i*20),4+7.45,-25])cylinder(d=2.8,h=230,$fn=50);
}
*/

translate([12,0,0]){

translate([9.5-1.7,4+7.45,-2])cylinder(d=2.8,h=30,$fn=50);
translate([9.5-1.7,4+7.45+13,-2])cylinder(d=2.8,h=30,$fn=50);

translate([9.5,4,-2])cylinder(d=3.5,h=30,$fn=50);
translate([9.5,4+15,-2])cylinder(d=3.5,h=30,$fn=50);
translate([0,0,5]){
translate([9.5,4,-0.2])cylinder(d=7.5,h=30,$fn=50);
translate([9.5,4+15,0])cylinder(d=7.5,h=30,$fn=50);
}
}


}
}












module battery_18650_holder(){
color("peru")translate([-20,35.525,0-1.775])
difference(){
union(){
//translate([-15,-15,-13.7])cube([30,30,10]);
//translate([-15+11,-15,-13.7-7])cube([19,30,10]);
translate([0,0,-6])rotate([0,90,0])cylinder(d1=15,d2=25,h=20,$fn=50);
translate([20,0,-6])rotate([0,90,0])cylinder(d=25,h=20,$fn=50);
}
/*
translate([-10.3,7.5,-6])rotate([0,0,0])cylinder(d=3.8,h=20,$fn=50);
translate([-10.3,7.5-13,-6])rotate([0,0,0])cylinder(d=3.8,h=20,$fn=50);
*/

translate([-5,0,0])hull(){
translate([30,-0.2,-6+0])rotate([0,90,0])cylinder(d=18.4,h=20,$fn=50);
translate([30,-0.2,-6+20])rotate([0,90,0])cylinder(d=18.4,h=20,$fn=50);
}
translate([0,0,-6])rotate([0,90,0])cylinder(d=5,h=20,$fn=50);
translate([4,0,-6])rotate([0,0,0])cylinder(d=2.8,h=20,$fn=50);
translate([4,0,-6])rotate([90,0,0])cylinder(d=2.8,h=20,$fn=50);
}
}


module bearing_6204(){

// OpenSCAD Model: Standard 6204 Ball Bearing
// Dimensions: 20mm (Bore) x 47mm (OD) x 14mm (Width)

$fn = 100; // High resolution for smooth curves

// 6204 Dimensions (in mm)
bore_d = 20;
outer_d = 47;
width = 14;

// Ball and Track Details
ball_d = 7.94; // Standard ball size for 6204 (~5/16 inch)
pitch_d = (outer_d + bore_d) / 2; // 33.5mm center track diameter
num_balls = 8; 

module inner_ring() {
    difference() {
        cylinder(h = width, d = pitch_d - (ball_d * 0.8), center = true);
        cylinder(h = width + 2, d = bore_d, center = true); // Inner hole
        // Ball race groove
        rotate_extrude() translate([pitch_d / 2, 0, 0]) circle(d = ball_d + 0.2);
    }
}

module outer_ring() {
    difference() {
        cylinder(h = width, d = outer_d, center = true);
        cylinder(h = width + 2, d = pitch_d + (ball_d * 0.8), center = true);
        // Ball race groove
        rotate_extrude() translate([pitch_d / 2, 0, 0]) circle(d = ball_d + 0.2);
    }
}


module balls() {
    for (i = [0 : num_balls - 1]) {
        rotate([0, 0, i * (360 / num_balls)])
        translate([pitch_d / 2, 0, 0])
        sphere(d = ball_d, $fn = 50);
    }
}

// Assemble the bearing
color("Silver") inner_ring();
color("Silver") outer_ring();
color("Gold") balls(); // Colored gold just to make the balls highly visible


}


module bearing_608(){
// OpenSCAD Model: Standard 608 Ball Bearing
// Dimensions: 8mm (Bore) x 22mm (OD) x 7mm (Width)

$fn = 100; // High resolution for smooth curves

// 608 Dimensions (in mm)
bore_d = 8;
outer_d = 22;
width = 7;

// Ball and Track Details
ball_d = 3.969; // Standard 5/32" ball size for 608 bearings
pitch_d = (outer_d + bore_d) / 2; // 15mm center track diameter
num_balls = 7; 

module inner_ring() {
    difference() {
        cylinder(h = width, d = pitch_d - (ball_d * 0.8), center = true);
        cylinder(h = width + 2, d = bore_d, center = true); // Inner hole
        // Ball race groove
        rotate_extrude() translate([pitch_d / 2, 0, 0]) circle(d = ball_d + 0.1);
    }
}

module outer_ring() {
    difference() {
        cylinder(h = width, d = outer_d, center = true);
        cylinder(h = width + 2, d = pitch_d + (ball_d * 0.8), center = true);
        // Ball race groove
        rotate_extrude() translate([pitch_d / 2, 0, 0]) circle(d = ball_d + 0.1);
    }
}

module balls() {
    for (i = [0 : num_balls - 1]) {
        rotate([0, 0, i * (360 / num_balls)])
        translate([pitch_d / 2, 0, 0])
        sphere(d = ball_d, $fn = 40);
    }
}

// Assemble the bearing
color("Silver") inner_ring();
color("Silver") outer_ring();
color("Gold") balls(); // Colored gold to make the balls highly visible
}

module battery_makelathe_cap(){
difference(){
union(){
color("red")translate([-7,45,-8])rotate([0,90,0])cylinder(d=12,h=6.5,$fn=50);
color("red")translate([-7-5,45,-8])rotate([0,90,0])cylinder(d=22,h=6.5,$fn=50);
}
translate([-7-5-4,45,-8])rotate([0,90,0])cylinder(d=18.5,h=6.5,$fn=50);
translate([-7-5-4,45,-8])rotate([0,90,0])cylinder(d=8.1,h=56.5,$fn=50);
}
}
